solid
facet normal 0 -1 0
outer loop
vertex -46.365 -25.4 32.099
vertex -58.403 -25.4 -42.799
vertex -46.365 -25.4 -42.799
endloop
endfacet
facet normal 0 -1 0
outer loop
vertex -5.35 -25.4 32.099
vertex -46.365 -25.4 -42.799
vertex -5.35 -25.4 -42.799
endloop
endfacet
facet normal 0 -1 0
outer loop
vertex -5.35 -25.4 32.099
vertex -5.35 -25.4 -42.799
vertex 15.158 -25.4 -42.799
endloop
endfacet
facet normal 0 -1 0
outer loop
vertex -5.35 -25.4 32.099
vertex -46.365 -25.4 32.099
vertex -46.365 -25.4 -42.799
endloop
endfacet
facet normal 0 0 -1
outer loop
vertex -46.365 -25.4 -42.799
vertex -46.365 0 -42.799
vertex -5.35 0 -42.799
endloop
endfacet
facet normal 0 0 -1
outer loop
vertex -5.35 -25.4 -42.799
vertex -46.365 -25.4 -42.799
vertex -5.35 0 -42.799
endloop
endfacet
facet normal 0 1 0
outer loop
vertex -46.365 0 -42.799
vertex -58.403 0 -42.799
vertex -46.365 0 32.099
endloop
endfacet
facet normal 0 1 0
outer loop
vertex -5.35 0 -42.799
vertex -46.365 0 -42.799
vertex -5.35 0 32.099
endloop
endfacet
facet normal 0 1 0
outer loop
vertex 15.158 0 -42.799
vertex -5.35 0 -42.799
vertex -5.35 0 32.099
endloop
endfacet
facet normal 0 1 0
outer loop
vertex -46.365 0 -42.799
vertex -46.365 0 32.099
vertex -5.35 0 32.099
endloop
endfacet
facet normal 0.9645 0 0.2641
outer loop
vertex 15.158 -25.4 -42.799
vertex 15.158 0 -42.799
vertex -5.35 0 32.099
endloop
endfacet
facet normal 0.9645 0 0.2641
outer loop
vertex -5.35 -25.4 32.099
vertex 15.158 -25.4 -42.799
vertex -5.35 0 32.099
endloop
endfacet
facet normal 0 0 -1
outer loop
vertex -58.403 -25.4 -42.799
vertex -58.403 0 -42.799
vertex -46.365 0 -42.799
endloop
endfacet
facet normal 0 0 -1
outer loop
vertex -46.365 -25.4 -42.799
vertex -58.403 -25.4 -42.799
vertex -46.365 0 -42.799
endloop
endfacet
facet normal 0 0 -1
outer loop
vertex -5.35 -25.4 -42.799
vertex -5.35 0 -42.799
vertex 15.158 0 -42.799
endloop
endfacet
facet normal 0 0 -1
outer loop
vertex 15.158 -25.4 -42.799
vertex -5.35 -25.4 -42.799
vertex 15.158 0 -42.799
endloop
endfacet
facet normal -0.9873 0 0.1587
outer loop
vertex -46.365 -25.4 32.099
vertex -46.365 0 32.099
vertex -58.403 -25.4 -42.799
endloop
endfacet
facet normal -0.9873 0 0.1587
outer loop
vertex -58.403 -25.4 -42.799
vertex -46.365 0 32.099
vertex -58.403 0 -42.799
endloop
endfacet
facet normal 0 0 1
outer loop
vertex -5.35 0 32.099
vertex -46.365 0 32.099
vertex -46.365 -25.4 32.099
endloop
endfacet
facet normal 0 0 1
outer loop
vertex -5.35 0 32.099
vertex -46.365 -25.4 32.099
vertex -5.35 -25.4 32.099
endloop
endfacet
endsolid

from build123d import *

# Parameters (mm, degrees)
F0_W     = 41.015632
F0_H     = 74.898109
F1_DEPTH = 25.4


with BuildPart() as f1:
    # F0 (on Front) → F1 (new body)
    with BuildSketch(Plane.XZ):
        with Locations((-25.85768, -5.349864)):
            Rectangle(F0_W, F0_H)
        Polygon((-58.402691, -42.798918), (-46.365496, -42.798918), (-46.365496, 32.099191), align=None)
        Polygon((-5.349864, 32.099191), (-5.349864, -42.798918), (6.687334, -42.798918), (15.157951, -42.798918), align=None)
    extrude(amount=F1_DEPTH)


solid = f1.part
